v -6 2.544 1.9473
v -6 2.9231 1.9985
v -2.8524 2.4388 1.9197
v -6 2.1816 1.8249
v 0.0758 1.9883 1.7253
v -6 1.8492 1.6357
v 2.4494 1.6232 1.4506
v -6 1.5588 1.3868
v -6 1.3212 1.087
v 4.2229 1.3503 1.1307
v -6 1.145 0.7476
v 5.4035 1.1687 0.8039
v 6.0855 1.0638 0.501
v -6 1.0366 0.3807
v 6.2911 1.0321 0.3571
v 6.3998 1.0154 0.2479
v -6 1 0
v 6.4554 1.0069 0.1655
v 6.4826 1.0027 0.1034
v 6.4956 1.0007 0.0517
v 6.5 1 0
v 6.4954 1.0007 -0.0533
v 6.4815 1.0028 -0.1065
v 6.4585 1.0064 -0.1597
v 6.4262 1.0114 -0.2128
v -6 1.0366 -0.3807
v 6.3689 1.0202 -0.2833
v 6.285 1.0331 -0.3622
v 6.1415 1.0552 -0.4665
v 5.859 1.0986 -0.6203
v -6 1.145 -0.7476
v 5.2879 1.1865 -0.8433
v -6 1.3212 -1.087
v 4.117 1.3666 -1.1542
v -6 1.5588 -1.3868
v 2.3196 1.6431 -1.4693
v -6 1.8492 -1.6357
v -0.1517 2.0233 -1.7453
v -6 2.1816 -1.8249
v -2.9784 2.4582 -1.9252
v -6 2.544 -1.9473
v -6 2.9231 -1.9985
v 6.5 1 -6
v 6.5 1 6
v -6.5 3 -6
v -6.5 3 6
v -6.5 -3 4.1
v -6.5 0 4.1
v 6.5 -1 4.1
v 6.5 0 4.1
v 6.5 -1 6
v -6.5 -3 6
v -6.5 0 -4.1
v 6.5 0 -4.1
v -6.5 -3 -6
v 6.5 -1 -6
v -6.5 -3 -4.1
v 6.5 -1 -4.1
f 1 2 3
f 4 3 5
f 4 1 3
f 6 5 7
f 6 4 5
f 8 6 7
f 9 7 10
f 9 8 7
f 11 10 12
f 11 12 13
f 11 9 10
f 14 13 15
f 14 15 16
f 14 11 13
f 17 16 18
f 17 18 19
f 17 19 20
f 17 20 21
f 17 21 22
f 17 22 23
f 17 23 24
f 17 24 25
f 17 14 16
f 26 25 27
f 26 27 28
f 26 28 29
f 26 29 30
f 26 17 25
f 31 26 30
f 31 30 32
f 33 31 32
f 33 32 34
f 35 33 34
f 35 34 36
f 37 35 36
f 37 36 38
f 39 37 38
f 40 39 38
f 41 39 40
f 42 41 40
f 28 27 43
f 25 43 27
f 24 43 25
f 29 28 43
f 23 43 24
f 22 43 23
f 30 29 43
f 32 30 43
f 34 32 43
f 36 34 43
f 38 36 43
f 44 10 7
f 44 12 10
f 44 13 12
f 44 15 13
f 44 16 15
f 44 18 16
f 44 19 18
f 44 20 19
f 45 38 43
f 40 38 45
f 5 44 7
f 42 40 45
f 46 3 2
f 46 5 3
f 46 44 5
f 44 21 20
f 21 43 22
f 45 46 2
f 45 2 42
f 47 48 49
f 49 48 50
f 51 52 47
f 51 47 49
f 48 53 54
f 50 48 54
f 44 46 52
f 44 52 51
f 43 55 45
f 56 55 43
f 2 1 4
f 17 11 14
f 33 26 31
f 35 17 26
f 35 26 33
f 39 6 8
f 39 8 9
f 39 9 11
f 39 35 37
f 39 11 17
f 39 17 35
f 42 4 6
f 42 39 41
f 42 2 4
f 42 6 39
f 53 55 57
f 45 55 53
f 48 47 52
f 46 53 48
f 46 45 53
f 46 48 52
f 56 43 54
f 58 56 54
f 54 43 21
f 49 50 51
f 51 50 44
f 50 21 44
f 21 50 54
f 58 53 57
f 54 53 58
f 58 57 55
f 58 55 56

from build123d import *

# Parameters (mm, degrees)
SKETCH1_W           = 13
SKETCH1_H           = 12
BOSS_EXTRUDE1_DEPTH = 3
SKETCH2_W           = 13
SKETCH2_H           = 1.9
BOSS_EXTRUDE2_DEPTH = 3
CHAMFER1_SIZE       = 13
CHAMFER1_SIZE_2     = 2
CUT_EXTRUDE1_REACH  = 17.129
CUT_EXTRUDE1_START  = -0.5


with BuildPart() as part:
    # Sketch1 → Boss-Extrude1 (new body)
    with BuildSketch(Plane(origin=(0, 0, 0), x_dir=(1, 0, 0), z_dir=(0, 1, 0))):
        Rectangle(SKETCH1_W, SKETCH1_H)
    extrude(amount=BOSS_EXTRUDE1_DEPTH)

    # Sketch2 → Boss-Extrude2 (add)
    with BuildSketch(Plane.XZ):
        with Locations((0, 5.05)):
            Rectangle(SKETCH2_W, SKETCH2_H)
        with Locations((0, -5.05)):
            Rectangle(SKETCH2_W, SKETCH2_H)
    extrude(amount=BOSS_EXTRUDE2_DEPTH)

    # Chamfer1
    # the kernel refuses this chamfer: 13, 2 mm, written as the material it takes off along each edge
    with BuildSketch(Plane(origin=(6.5, -3, 39.785461495), x_dir=(-0.9999828835142526, -0.005850869894363576, 0), z_dir=(0, 0, -1))) as chamfer1_piece_1:
        Polygon((CHAMFER1_SIZE * 0.999982883514, CHAMFER1_SIZE * 0.00585086989436), (-CHAMFER1_SIZE_2 * 0.00585086989436, CHAMFER1_SIZE_2 * 0.999982883514), (0, 0), align=None)
    extrude(amount=69.470922991, mode=Mode.SUBTRACT)
    with BuildSketch(Plane(origin=(6.5, -3, -39.785461495), x_dir=(-0.9999828835142526, -0.005850869894363576, 0), z_dir=(0, 0, 1))) as chamfer1_piece_2:
        Polygon((CHAMFER1_SIZE * 0.999982883514, -CHAMFER1_SIZE * 0.00585086989436), (-CHAMFER1_SIZE_2 * 0.00585086989436, -CHAMFER1_SIZE_2 * 0.999982883514), (0, 0), align=None)
    extrude(amount=69.470922991, mode=Mode.SUBTRACT)
    with BuildSketch(Plane(origin=(6.5, 3, 39.785461495), x_dir=(0.23997968203750644, -0.9707779108576674, 0), z_dir=(0, 0, -1))) as chamfer1_piece_3:
        Polygon((CHAMFER1_SIZE_2 * 0.970777910858, CHAMFER1_SIZE_2 * 0.239979682038), (-CHAMFER1_SIZE * 0.239979682038, CHAMFER1_SIZE * 0.970777910858), (0, 0), align=None)
    extrude(amount=79.570922991, mode=Mode.SUBTRACT)

    # Sketch5 → Cut-Extrude1 (cut, up to next)
    with BuildSketch(Plane.ZY.offset(6.5).offset(CUT_EXTRUDE1_START), mode=Mode.PRIVATE) as cut_extrude1_sk1:
        with BuildLine():
            Line((-2, 3), (2, 3))
            ThreePointArc((2, 3), (0, 1), (-2, 3))
        make_face()
    cut_extrude1_tool1 = extrude(cut_extrude1_sk1.sketch, amount=-CUT_EXTRUDE1_REACH, mode=Mode.PRIVATE) & part.part
    add(cut_extrude1_tool1.solids().sort_by_distance((-6, 2.151174, 0))[0], mode=Mode.SUBTRACT)


solid = part.part
